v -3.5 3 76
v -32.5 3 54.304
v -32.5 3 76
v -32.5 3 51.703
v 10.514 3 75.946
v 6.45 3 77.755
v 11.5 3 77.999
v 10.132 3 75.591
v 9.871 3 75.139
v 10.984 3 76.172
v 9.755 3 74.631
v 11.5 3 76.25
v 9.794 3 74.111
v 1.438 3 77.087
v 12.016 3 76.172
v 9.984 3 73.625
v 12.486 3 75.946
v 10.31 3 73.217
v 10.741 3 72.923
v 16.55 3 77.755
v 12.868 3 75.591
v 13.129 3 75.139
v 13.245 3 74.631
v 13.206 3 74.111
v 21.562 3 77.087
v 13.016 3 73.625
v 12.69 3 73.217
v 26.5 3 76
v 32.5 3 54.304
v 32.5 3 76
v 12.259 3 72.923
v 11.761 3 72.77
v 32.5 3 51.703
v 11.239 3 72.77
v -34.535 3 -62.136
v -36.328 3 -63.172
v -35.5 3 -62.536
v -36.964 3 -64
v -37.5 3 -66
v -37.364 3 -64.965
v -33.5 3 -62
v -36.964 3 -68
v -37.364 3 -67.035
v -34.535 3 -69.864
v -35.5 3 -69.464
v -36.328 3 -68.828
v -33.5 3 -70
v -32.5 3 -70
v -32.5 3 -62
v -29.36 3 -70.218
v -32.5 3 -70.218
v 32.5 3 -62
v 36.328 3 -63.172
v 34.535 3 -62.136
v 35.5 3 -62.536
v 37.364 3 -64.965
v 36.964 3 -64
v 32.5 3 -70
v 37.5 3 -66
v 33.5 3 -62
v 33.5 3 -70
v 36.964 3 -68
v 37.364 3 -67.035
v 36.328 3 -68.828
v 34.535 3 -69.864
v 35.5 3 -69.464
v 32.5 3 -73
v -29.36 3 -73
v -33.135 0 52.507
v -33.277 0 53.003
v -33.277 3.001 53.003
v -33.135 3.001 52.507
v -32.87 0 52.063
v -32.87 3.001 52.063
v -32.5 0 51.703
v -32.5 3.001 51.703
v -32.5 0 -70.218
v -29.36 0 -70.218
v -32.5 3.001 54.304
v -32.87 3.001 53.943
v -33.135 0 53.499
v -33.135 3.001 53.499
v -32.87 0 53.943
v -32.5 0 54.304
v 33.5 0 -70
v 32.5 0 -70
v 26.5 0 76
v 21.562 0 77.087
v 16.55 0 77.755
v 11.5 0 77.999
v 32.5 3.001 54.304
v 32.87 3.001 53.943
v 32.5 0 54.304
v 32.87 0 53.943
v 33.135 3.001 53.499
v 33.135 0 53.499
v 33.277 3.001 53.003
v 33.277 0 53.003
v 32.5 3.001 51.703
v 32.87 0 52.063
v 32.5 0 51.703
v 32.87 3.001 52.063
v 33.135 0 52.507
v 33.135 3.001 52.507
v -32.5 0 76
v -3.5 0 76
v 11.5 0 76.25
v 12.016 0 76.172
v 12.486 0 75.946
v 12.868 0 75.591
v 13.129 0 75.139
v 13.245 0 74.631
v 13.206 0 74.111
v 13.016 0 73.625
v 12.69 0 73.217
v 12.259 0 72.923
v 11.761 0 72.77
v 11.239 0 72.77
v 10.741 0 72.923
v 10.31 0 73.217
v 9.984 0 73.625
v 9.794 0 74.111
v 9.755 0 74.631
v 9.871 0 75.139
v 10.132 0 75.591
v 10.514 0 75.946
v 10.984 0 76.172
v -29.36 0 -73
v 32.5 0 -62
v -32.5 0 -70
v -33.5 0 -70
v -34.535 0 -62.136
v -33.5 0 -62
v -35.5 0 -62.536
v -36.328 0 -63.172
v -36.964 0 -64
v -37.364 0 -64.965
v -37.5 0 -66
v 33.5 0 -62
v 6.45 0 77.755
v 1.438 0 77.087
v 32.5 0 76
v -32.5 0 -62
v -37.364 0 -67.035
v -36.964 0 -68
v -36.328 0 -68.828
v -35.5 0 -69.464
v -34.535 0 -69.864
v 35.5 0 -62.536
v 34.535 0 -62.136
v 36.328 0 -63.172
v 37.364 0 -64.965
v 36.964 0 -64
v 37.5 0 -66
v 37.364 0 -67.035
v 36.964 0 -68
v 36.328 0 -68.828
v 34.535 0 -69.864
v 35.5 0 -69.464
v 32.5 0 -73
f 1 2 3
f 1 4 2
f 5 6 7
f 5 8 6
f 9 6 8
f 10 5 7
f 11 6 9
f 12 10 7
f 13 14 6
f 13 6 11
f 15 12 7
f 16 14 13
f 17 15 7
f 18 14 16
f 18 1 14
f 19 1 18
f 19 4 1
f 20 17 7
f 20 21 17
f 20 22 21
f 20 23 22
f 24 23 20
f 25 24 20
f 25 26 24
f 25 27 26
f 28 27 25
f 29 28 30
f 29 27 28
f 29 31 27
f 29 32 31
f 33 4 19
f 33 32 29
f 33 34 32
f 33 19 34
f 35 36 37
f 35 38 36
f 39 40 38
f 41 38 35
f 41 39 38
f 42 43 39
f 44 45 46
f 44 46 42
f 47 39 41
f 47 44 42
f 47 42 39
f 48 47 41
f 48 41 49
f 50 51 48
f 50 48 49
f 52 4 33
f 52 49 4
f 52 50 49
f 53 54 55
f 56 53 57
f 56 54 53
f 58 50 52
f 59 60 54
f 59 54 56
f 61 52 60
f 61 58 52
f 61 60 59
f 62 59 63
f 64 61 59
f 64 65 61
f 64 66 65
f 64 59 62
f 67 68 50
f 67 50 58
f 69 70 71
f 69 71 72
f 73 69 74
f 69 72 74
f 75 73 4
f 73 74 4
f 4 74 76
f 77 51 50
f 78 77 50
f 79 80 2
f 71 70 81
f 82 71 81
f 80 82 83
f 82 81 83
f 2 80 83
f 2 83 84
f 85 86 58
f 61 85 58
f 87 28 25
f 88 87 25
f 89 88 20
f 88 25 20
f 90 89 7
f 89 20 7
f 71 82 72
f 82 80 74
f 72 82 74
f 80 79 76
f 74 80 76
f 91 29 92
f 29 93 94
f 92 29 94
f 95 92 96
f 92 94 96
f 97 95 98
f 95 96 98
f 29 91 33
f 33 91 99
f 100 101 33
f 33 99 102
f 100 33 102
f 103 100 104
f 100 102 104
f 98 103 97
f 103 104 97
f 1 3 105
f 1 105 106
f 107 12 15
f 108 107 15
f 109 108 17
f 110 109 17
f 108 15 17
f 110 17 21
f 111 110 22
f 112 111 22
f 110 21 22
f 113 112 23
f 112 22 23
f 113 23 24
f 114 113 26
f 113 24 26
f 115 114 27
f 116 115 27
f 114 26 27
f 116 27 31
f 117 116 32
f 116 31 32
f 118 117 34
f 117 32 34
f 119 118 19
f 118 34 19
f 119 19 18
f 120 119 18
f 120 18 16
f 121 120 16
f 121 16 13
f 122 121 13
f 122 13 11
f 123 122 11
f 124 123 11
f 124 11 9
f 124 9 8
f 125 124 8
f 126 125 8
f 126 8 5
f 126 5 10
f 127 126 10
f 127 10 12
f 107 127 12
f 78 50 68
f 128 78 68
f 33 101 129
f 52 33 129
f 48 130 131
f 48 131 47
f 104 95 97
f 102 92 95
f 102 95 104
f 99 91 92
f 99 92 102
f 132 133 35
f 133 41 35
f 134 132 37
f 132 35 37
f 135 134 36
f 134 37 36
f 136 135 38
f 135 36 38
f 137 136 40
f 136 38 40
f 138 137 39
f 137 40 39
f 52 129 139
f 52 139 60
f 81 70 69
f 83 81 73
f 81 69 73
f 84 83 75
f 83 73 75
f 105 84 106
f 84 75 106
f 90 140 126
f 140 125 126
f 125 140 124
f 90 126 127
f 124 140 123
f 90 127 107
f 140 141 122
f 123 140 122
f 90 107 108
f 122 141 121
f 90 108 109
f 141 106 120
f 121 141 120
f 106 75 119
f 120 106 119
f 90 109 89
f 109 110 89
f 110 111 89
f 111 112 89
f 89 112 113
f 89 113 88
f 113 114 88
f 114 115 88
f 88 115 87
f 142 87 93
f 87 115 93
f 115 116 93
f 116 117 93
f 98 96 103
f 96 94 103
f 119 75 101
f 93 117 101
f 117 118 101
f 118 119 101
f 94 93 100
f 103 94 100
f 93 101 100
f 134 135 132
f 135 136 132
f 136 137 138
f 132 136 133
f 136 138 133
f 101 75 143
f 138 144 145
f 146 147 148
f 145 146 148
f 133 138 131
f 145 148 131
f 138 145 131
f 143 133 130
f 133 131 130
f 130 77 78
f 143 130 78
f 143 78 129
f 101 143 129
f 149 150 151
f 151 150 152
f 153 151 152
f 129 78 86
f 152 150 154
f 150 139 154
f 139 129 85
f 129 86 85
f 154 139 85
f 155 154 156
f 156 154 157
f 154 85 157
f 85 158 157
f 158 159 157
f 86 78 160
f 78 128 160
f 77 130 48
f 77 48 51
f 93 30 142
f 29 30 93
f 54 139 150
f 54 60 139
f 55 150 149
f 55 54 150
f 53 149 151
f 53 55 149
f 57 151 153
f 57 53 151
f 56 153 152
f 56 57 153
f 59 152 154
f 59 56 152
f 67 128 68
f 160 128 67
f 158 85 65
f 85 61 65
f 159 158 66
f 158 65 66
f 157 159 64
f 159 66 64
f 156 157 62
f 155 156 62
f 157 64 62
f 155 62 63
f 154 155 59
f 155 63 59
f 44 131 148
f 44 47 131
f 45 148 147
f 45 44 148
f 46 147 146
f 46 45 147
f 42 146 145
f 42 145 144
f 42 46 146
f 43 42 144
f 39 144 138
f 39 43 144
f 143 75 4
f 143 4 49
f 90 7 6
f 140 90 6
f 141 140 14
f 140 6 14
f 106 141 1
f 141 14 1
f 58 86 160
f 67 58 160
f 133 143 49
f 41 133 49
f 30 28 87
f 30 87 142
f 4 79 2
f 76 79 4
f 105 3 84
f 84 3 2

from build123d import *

# Parameters (mm, degrees)
CROQUIS1_W               = 65
CROQUIS1_H               = 146
SALIENTE_EXTRUIR1_DEPTH  = 3
CROQUIS2_W               = 8
CROQUIS2_H               = 3
SALIENTE_EXTRUIR2_DEPTH  = 5
REDONDEO1_R              = 4
REDONDEO1_OF_SIMETR_A1_R = 4
CROQUIS3_W               = 2.60095456
CROQUIS3_H               = 3.001101416
SALIENTE_EXTRUIR3_DEPTH  = 0.8
REDONDEO2_R              = 2
REDONDEO2_OF_SIMETR_A5_R = 2
CROQUIS4_W               = 65
CROQUIS4_H               = 3
CROQUIS4_W_2             = 30
CROQUIS4_H_2             = 2
SALIENTE_EXTRUIR4_DEPTH  = 3
REDONDEO3_R              = 60
CROQUIS6_W               = 3.139643751
CROQUIS6_H               = 2.781946526
CORTAR_EXTRUIR1_DEPTH    = 10
CROQUIS8_R               = 1.75
CORTAR_EXTRUIR2_DEPTH    = 10


# Some blends are built 0.0001 mm under size
with BuildPart() as part:
    # Croquis1 → Saliente-Extruir1 (new body)
    with BuildSketch(Plane(origin=(0, 0, 0), x_dir=(1, 0, 0), z_dir=(0, 1, 0))):
        Rectangle(CROQUIS1_W, CROQUIS1_H)
    extrude(amount=SALIENTE_EXTRUIR1_DEPTH)

    # Croquis2 → Saliente-Extruir2 (add)
    with BuildSketch(Plane(origin=(32.5, 0, 0), x_dir=(0, 0, -1), z_dir=(1, 0, 0))):
        with Locations((66, 1.5)):
            Rectangle(CROQUIS2_W, CROQUIS2_H)
    saliente_extruir2 = extrude(amount=SALIENTE_EXTRUIR2_DEPTH)

    # Redondeo1
    redondeo1_edges = [part.edges().sort_by_distance(p)[0] for p in [
        (37.5, 1.5, -62),
        (37.5, 1.5, -70),
    ]]
    fillet(redondeo1_edges, radius=REDONDEO1_R - 0.0001)  # a hair under: the kernel refuses the full size

    # Simetría1: Saliente-Extruir2 across plane
    add(saliente_extruir2.mirror(Plane(origin=(0, 0, 0), x_dir=(0, 0, 1), z_dir=(1, 0, 0))))

    # Redondeo1 of Simetría1
    redondeo1_of_simetr_a1_edges = [part.edges().sort_by_distance(p)[0] for p in [
        (-37.5, 1.5, -62),
        (-37.5, 1.5, -70),
    ]]
    fillet(redondeo1_of_simetr_a1_edges, radius=REDONDEO1_OF_SIMETR_A1_R - 0.0001)  # a hair under: the kernel refuses the full size

    # Croquis3 → Saliente-Extruir3 (add)
    with BuildSketch(Plane(origin=(32.5, 0, 0), x_dir=(0, 0, -1), z_dir=(1, 0, 0))):
        with Locations((-53.003039433, 1.500550708)):
            Rectangle(CROQUIS3_W, CROQUIS3_H)
    saliente_extruir3 = extrude(amount=SALIENTE_EXTRUIR3_DEPTH)

    # Redondeo2
    # the kernel refuses this fillet: 2 mm, written as the material it takes off along each edge
    with BuildSketch(Plane(origin=(33.3, 7.001101416, 51.702562153), x_dir=(-1, 0, 0), z_dir=(0, -1, 0)), Plane(origin=(33.3, -4, 54.303516713), x_dir=(-1, 0, 0), z_dir=(0, 1, 0))) as redondeo2_piece_1:
        with BuildLine():
            CenterArc((2, -1.6), REDONDEO2_R, 126.869897646, 53.130102354)
            Line((0, -1.6), (-0.04, -1.6))
            Line((-0.04, -1.6), (-0.04, 0))
            Line((-0.04, 0), (0, 0.04))
            ThreePointArc((0, 0.04), (0.4, 0.04), (0.776, 0.032))
            Line((0.776, 0.032), (0.8, 0))
        make_face()
    extrude(amount=11.001101416, mode=Mode.SUBTRACT)

    # Simetría5: Saliente-Extruir3 across plane
    add(saliente_extruir3.mirror(Plane(origin=(0, 0, 0), x_dir=(0, 0, 1), z_dir=(1, 0, 0))))

    # Redondeo2 of Simetría5
    # the kernel refuses this fillet: 2 mm, written as the material it takes off along each edge
    with BuildSketch(Plane(origin=(-33.3, 7.001101416, 51.702562153), x_dir=(1, 0, 0), z_dir=(0, -1, 0)), Plane(origin=(-33.3, -4, 54.303516713), x_dir=(1, 0, 0), z_dir=(0, 1, 0))) as redondeo2_of_simetr_a5_piece_1:
        with BuildLine():
            CenterArc((2, 1.6), REDONDEO2_OF_SIMETR_A5_R, 180, 53.130102354)
            Line((0, 1.6), (-0.04, 1.6))
            Line((-0.04, 1.6), (-0.04, 0))
            Line((-0.04, 0), (0, -0.04))
            ThreePointArc((0, -0.04), (0.4, -0.04), (0.776, -0.032))
            Line((0.776, -0.032), (0.8, 0))
        make_face()
    extrude(amount=11.001101416, mode=Mode.SUBTRACT)

    # Croquis4 → Saliente-Extruir4 (add)
    with BuildSketch(Plane(origin=(0, 3, 0), x_dir=(1, 0, 0), z_dir=(0, 1, 0))):
        with Locations((0, -74.5)):
            Rectangle(CROQUIS4_W, CROQUIS4_H)
        with Locations((11.5, -77)):
            Rectangle(CROQUIS4_W_2, CROQUIS4_H_2)
    extrude(amount=-SALIENTE_EXTRUIR4_DEPTH)

    # Redondeo3
    # the kernel refuses this fillet: 60 mm, written as the material it takes off along each edge
    with BuildSketch(Plane(origin=(26.5, 41.405728739, 78), x_dir=(0, 0, -1), z_dir=(0, -1, 0))) as redondeo3_piece_1:
        with BuildLine():
            CenterArc((60, -15.362291496), REDONDEO3_R, 165.164888418, 14.835111582)
            Line((0, -15.362291496), (0, 0))
            Line((0, 0), (2, 0))
        make_face()
    extrude(amount=79.811457479, mode=Mode.SUBTRACT)
    with BuildSketch(Plane(origin=(-3.5, 41.405728739, 78), x_dir=(1, 0, 0), z_dir=(0, -1, 0))) as redondeo3_piece_2:
        with BuildLine():
            CenterArc((15.362291496, -60), REDONDEO3_R, 90, 14.835111582)
            Line((0, -2), (0, 0))
            Line((0, 0), (15.362291496, 0))
        make_face()
    extrude(amount=79.811457479, mode=Mode.SUBTRACT)

    # Croquis6 → Cortar-Extruir1 (cut)
    with BuildSketch(Plane(origin=(0, 3, 0), x_dir=(1, 0, 0), z_dir=(0, 1, 0))):
        with Locations((-30.930178125, 71.609026737)):
            Rectangle(CROQUIS6_W, CROQUIS6_H)
    extrude(amount=-CORTAR_EXTRUIR1_DEPTH, mode=Mode.SUBTRACT)

    # Croquis8 → Cortar-Extruir2 (cut)
    with BuildSketch(Plane(origin=(0, 3, 0), x_dir=(1, 0, 0), z_dir=(0, 1, 0))):
        with Locations(Location((11.5, -74.5, 0), (0, 0, 270))):
            Circle(CROQUIS8_R)
    extrude(amount=-CORTAR_EXTRUIR2_DEPTH, mode=Mode.SUBTRACT)


solid = part.part
